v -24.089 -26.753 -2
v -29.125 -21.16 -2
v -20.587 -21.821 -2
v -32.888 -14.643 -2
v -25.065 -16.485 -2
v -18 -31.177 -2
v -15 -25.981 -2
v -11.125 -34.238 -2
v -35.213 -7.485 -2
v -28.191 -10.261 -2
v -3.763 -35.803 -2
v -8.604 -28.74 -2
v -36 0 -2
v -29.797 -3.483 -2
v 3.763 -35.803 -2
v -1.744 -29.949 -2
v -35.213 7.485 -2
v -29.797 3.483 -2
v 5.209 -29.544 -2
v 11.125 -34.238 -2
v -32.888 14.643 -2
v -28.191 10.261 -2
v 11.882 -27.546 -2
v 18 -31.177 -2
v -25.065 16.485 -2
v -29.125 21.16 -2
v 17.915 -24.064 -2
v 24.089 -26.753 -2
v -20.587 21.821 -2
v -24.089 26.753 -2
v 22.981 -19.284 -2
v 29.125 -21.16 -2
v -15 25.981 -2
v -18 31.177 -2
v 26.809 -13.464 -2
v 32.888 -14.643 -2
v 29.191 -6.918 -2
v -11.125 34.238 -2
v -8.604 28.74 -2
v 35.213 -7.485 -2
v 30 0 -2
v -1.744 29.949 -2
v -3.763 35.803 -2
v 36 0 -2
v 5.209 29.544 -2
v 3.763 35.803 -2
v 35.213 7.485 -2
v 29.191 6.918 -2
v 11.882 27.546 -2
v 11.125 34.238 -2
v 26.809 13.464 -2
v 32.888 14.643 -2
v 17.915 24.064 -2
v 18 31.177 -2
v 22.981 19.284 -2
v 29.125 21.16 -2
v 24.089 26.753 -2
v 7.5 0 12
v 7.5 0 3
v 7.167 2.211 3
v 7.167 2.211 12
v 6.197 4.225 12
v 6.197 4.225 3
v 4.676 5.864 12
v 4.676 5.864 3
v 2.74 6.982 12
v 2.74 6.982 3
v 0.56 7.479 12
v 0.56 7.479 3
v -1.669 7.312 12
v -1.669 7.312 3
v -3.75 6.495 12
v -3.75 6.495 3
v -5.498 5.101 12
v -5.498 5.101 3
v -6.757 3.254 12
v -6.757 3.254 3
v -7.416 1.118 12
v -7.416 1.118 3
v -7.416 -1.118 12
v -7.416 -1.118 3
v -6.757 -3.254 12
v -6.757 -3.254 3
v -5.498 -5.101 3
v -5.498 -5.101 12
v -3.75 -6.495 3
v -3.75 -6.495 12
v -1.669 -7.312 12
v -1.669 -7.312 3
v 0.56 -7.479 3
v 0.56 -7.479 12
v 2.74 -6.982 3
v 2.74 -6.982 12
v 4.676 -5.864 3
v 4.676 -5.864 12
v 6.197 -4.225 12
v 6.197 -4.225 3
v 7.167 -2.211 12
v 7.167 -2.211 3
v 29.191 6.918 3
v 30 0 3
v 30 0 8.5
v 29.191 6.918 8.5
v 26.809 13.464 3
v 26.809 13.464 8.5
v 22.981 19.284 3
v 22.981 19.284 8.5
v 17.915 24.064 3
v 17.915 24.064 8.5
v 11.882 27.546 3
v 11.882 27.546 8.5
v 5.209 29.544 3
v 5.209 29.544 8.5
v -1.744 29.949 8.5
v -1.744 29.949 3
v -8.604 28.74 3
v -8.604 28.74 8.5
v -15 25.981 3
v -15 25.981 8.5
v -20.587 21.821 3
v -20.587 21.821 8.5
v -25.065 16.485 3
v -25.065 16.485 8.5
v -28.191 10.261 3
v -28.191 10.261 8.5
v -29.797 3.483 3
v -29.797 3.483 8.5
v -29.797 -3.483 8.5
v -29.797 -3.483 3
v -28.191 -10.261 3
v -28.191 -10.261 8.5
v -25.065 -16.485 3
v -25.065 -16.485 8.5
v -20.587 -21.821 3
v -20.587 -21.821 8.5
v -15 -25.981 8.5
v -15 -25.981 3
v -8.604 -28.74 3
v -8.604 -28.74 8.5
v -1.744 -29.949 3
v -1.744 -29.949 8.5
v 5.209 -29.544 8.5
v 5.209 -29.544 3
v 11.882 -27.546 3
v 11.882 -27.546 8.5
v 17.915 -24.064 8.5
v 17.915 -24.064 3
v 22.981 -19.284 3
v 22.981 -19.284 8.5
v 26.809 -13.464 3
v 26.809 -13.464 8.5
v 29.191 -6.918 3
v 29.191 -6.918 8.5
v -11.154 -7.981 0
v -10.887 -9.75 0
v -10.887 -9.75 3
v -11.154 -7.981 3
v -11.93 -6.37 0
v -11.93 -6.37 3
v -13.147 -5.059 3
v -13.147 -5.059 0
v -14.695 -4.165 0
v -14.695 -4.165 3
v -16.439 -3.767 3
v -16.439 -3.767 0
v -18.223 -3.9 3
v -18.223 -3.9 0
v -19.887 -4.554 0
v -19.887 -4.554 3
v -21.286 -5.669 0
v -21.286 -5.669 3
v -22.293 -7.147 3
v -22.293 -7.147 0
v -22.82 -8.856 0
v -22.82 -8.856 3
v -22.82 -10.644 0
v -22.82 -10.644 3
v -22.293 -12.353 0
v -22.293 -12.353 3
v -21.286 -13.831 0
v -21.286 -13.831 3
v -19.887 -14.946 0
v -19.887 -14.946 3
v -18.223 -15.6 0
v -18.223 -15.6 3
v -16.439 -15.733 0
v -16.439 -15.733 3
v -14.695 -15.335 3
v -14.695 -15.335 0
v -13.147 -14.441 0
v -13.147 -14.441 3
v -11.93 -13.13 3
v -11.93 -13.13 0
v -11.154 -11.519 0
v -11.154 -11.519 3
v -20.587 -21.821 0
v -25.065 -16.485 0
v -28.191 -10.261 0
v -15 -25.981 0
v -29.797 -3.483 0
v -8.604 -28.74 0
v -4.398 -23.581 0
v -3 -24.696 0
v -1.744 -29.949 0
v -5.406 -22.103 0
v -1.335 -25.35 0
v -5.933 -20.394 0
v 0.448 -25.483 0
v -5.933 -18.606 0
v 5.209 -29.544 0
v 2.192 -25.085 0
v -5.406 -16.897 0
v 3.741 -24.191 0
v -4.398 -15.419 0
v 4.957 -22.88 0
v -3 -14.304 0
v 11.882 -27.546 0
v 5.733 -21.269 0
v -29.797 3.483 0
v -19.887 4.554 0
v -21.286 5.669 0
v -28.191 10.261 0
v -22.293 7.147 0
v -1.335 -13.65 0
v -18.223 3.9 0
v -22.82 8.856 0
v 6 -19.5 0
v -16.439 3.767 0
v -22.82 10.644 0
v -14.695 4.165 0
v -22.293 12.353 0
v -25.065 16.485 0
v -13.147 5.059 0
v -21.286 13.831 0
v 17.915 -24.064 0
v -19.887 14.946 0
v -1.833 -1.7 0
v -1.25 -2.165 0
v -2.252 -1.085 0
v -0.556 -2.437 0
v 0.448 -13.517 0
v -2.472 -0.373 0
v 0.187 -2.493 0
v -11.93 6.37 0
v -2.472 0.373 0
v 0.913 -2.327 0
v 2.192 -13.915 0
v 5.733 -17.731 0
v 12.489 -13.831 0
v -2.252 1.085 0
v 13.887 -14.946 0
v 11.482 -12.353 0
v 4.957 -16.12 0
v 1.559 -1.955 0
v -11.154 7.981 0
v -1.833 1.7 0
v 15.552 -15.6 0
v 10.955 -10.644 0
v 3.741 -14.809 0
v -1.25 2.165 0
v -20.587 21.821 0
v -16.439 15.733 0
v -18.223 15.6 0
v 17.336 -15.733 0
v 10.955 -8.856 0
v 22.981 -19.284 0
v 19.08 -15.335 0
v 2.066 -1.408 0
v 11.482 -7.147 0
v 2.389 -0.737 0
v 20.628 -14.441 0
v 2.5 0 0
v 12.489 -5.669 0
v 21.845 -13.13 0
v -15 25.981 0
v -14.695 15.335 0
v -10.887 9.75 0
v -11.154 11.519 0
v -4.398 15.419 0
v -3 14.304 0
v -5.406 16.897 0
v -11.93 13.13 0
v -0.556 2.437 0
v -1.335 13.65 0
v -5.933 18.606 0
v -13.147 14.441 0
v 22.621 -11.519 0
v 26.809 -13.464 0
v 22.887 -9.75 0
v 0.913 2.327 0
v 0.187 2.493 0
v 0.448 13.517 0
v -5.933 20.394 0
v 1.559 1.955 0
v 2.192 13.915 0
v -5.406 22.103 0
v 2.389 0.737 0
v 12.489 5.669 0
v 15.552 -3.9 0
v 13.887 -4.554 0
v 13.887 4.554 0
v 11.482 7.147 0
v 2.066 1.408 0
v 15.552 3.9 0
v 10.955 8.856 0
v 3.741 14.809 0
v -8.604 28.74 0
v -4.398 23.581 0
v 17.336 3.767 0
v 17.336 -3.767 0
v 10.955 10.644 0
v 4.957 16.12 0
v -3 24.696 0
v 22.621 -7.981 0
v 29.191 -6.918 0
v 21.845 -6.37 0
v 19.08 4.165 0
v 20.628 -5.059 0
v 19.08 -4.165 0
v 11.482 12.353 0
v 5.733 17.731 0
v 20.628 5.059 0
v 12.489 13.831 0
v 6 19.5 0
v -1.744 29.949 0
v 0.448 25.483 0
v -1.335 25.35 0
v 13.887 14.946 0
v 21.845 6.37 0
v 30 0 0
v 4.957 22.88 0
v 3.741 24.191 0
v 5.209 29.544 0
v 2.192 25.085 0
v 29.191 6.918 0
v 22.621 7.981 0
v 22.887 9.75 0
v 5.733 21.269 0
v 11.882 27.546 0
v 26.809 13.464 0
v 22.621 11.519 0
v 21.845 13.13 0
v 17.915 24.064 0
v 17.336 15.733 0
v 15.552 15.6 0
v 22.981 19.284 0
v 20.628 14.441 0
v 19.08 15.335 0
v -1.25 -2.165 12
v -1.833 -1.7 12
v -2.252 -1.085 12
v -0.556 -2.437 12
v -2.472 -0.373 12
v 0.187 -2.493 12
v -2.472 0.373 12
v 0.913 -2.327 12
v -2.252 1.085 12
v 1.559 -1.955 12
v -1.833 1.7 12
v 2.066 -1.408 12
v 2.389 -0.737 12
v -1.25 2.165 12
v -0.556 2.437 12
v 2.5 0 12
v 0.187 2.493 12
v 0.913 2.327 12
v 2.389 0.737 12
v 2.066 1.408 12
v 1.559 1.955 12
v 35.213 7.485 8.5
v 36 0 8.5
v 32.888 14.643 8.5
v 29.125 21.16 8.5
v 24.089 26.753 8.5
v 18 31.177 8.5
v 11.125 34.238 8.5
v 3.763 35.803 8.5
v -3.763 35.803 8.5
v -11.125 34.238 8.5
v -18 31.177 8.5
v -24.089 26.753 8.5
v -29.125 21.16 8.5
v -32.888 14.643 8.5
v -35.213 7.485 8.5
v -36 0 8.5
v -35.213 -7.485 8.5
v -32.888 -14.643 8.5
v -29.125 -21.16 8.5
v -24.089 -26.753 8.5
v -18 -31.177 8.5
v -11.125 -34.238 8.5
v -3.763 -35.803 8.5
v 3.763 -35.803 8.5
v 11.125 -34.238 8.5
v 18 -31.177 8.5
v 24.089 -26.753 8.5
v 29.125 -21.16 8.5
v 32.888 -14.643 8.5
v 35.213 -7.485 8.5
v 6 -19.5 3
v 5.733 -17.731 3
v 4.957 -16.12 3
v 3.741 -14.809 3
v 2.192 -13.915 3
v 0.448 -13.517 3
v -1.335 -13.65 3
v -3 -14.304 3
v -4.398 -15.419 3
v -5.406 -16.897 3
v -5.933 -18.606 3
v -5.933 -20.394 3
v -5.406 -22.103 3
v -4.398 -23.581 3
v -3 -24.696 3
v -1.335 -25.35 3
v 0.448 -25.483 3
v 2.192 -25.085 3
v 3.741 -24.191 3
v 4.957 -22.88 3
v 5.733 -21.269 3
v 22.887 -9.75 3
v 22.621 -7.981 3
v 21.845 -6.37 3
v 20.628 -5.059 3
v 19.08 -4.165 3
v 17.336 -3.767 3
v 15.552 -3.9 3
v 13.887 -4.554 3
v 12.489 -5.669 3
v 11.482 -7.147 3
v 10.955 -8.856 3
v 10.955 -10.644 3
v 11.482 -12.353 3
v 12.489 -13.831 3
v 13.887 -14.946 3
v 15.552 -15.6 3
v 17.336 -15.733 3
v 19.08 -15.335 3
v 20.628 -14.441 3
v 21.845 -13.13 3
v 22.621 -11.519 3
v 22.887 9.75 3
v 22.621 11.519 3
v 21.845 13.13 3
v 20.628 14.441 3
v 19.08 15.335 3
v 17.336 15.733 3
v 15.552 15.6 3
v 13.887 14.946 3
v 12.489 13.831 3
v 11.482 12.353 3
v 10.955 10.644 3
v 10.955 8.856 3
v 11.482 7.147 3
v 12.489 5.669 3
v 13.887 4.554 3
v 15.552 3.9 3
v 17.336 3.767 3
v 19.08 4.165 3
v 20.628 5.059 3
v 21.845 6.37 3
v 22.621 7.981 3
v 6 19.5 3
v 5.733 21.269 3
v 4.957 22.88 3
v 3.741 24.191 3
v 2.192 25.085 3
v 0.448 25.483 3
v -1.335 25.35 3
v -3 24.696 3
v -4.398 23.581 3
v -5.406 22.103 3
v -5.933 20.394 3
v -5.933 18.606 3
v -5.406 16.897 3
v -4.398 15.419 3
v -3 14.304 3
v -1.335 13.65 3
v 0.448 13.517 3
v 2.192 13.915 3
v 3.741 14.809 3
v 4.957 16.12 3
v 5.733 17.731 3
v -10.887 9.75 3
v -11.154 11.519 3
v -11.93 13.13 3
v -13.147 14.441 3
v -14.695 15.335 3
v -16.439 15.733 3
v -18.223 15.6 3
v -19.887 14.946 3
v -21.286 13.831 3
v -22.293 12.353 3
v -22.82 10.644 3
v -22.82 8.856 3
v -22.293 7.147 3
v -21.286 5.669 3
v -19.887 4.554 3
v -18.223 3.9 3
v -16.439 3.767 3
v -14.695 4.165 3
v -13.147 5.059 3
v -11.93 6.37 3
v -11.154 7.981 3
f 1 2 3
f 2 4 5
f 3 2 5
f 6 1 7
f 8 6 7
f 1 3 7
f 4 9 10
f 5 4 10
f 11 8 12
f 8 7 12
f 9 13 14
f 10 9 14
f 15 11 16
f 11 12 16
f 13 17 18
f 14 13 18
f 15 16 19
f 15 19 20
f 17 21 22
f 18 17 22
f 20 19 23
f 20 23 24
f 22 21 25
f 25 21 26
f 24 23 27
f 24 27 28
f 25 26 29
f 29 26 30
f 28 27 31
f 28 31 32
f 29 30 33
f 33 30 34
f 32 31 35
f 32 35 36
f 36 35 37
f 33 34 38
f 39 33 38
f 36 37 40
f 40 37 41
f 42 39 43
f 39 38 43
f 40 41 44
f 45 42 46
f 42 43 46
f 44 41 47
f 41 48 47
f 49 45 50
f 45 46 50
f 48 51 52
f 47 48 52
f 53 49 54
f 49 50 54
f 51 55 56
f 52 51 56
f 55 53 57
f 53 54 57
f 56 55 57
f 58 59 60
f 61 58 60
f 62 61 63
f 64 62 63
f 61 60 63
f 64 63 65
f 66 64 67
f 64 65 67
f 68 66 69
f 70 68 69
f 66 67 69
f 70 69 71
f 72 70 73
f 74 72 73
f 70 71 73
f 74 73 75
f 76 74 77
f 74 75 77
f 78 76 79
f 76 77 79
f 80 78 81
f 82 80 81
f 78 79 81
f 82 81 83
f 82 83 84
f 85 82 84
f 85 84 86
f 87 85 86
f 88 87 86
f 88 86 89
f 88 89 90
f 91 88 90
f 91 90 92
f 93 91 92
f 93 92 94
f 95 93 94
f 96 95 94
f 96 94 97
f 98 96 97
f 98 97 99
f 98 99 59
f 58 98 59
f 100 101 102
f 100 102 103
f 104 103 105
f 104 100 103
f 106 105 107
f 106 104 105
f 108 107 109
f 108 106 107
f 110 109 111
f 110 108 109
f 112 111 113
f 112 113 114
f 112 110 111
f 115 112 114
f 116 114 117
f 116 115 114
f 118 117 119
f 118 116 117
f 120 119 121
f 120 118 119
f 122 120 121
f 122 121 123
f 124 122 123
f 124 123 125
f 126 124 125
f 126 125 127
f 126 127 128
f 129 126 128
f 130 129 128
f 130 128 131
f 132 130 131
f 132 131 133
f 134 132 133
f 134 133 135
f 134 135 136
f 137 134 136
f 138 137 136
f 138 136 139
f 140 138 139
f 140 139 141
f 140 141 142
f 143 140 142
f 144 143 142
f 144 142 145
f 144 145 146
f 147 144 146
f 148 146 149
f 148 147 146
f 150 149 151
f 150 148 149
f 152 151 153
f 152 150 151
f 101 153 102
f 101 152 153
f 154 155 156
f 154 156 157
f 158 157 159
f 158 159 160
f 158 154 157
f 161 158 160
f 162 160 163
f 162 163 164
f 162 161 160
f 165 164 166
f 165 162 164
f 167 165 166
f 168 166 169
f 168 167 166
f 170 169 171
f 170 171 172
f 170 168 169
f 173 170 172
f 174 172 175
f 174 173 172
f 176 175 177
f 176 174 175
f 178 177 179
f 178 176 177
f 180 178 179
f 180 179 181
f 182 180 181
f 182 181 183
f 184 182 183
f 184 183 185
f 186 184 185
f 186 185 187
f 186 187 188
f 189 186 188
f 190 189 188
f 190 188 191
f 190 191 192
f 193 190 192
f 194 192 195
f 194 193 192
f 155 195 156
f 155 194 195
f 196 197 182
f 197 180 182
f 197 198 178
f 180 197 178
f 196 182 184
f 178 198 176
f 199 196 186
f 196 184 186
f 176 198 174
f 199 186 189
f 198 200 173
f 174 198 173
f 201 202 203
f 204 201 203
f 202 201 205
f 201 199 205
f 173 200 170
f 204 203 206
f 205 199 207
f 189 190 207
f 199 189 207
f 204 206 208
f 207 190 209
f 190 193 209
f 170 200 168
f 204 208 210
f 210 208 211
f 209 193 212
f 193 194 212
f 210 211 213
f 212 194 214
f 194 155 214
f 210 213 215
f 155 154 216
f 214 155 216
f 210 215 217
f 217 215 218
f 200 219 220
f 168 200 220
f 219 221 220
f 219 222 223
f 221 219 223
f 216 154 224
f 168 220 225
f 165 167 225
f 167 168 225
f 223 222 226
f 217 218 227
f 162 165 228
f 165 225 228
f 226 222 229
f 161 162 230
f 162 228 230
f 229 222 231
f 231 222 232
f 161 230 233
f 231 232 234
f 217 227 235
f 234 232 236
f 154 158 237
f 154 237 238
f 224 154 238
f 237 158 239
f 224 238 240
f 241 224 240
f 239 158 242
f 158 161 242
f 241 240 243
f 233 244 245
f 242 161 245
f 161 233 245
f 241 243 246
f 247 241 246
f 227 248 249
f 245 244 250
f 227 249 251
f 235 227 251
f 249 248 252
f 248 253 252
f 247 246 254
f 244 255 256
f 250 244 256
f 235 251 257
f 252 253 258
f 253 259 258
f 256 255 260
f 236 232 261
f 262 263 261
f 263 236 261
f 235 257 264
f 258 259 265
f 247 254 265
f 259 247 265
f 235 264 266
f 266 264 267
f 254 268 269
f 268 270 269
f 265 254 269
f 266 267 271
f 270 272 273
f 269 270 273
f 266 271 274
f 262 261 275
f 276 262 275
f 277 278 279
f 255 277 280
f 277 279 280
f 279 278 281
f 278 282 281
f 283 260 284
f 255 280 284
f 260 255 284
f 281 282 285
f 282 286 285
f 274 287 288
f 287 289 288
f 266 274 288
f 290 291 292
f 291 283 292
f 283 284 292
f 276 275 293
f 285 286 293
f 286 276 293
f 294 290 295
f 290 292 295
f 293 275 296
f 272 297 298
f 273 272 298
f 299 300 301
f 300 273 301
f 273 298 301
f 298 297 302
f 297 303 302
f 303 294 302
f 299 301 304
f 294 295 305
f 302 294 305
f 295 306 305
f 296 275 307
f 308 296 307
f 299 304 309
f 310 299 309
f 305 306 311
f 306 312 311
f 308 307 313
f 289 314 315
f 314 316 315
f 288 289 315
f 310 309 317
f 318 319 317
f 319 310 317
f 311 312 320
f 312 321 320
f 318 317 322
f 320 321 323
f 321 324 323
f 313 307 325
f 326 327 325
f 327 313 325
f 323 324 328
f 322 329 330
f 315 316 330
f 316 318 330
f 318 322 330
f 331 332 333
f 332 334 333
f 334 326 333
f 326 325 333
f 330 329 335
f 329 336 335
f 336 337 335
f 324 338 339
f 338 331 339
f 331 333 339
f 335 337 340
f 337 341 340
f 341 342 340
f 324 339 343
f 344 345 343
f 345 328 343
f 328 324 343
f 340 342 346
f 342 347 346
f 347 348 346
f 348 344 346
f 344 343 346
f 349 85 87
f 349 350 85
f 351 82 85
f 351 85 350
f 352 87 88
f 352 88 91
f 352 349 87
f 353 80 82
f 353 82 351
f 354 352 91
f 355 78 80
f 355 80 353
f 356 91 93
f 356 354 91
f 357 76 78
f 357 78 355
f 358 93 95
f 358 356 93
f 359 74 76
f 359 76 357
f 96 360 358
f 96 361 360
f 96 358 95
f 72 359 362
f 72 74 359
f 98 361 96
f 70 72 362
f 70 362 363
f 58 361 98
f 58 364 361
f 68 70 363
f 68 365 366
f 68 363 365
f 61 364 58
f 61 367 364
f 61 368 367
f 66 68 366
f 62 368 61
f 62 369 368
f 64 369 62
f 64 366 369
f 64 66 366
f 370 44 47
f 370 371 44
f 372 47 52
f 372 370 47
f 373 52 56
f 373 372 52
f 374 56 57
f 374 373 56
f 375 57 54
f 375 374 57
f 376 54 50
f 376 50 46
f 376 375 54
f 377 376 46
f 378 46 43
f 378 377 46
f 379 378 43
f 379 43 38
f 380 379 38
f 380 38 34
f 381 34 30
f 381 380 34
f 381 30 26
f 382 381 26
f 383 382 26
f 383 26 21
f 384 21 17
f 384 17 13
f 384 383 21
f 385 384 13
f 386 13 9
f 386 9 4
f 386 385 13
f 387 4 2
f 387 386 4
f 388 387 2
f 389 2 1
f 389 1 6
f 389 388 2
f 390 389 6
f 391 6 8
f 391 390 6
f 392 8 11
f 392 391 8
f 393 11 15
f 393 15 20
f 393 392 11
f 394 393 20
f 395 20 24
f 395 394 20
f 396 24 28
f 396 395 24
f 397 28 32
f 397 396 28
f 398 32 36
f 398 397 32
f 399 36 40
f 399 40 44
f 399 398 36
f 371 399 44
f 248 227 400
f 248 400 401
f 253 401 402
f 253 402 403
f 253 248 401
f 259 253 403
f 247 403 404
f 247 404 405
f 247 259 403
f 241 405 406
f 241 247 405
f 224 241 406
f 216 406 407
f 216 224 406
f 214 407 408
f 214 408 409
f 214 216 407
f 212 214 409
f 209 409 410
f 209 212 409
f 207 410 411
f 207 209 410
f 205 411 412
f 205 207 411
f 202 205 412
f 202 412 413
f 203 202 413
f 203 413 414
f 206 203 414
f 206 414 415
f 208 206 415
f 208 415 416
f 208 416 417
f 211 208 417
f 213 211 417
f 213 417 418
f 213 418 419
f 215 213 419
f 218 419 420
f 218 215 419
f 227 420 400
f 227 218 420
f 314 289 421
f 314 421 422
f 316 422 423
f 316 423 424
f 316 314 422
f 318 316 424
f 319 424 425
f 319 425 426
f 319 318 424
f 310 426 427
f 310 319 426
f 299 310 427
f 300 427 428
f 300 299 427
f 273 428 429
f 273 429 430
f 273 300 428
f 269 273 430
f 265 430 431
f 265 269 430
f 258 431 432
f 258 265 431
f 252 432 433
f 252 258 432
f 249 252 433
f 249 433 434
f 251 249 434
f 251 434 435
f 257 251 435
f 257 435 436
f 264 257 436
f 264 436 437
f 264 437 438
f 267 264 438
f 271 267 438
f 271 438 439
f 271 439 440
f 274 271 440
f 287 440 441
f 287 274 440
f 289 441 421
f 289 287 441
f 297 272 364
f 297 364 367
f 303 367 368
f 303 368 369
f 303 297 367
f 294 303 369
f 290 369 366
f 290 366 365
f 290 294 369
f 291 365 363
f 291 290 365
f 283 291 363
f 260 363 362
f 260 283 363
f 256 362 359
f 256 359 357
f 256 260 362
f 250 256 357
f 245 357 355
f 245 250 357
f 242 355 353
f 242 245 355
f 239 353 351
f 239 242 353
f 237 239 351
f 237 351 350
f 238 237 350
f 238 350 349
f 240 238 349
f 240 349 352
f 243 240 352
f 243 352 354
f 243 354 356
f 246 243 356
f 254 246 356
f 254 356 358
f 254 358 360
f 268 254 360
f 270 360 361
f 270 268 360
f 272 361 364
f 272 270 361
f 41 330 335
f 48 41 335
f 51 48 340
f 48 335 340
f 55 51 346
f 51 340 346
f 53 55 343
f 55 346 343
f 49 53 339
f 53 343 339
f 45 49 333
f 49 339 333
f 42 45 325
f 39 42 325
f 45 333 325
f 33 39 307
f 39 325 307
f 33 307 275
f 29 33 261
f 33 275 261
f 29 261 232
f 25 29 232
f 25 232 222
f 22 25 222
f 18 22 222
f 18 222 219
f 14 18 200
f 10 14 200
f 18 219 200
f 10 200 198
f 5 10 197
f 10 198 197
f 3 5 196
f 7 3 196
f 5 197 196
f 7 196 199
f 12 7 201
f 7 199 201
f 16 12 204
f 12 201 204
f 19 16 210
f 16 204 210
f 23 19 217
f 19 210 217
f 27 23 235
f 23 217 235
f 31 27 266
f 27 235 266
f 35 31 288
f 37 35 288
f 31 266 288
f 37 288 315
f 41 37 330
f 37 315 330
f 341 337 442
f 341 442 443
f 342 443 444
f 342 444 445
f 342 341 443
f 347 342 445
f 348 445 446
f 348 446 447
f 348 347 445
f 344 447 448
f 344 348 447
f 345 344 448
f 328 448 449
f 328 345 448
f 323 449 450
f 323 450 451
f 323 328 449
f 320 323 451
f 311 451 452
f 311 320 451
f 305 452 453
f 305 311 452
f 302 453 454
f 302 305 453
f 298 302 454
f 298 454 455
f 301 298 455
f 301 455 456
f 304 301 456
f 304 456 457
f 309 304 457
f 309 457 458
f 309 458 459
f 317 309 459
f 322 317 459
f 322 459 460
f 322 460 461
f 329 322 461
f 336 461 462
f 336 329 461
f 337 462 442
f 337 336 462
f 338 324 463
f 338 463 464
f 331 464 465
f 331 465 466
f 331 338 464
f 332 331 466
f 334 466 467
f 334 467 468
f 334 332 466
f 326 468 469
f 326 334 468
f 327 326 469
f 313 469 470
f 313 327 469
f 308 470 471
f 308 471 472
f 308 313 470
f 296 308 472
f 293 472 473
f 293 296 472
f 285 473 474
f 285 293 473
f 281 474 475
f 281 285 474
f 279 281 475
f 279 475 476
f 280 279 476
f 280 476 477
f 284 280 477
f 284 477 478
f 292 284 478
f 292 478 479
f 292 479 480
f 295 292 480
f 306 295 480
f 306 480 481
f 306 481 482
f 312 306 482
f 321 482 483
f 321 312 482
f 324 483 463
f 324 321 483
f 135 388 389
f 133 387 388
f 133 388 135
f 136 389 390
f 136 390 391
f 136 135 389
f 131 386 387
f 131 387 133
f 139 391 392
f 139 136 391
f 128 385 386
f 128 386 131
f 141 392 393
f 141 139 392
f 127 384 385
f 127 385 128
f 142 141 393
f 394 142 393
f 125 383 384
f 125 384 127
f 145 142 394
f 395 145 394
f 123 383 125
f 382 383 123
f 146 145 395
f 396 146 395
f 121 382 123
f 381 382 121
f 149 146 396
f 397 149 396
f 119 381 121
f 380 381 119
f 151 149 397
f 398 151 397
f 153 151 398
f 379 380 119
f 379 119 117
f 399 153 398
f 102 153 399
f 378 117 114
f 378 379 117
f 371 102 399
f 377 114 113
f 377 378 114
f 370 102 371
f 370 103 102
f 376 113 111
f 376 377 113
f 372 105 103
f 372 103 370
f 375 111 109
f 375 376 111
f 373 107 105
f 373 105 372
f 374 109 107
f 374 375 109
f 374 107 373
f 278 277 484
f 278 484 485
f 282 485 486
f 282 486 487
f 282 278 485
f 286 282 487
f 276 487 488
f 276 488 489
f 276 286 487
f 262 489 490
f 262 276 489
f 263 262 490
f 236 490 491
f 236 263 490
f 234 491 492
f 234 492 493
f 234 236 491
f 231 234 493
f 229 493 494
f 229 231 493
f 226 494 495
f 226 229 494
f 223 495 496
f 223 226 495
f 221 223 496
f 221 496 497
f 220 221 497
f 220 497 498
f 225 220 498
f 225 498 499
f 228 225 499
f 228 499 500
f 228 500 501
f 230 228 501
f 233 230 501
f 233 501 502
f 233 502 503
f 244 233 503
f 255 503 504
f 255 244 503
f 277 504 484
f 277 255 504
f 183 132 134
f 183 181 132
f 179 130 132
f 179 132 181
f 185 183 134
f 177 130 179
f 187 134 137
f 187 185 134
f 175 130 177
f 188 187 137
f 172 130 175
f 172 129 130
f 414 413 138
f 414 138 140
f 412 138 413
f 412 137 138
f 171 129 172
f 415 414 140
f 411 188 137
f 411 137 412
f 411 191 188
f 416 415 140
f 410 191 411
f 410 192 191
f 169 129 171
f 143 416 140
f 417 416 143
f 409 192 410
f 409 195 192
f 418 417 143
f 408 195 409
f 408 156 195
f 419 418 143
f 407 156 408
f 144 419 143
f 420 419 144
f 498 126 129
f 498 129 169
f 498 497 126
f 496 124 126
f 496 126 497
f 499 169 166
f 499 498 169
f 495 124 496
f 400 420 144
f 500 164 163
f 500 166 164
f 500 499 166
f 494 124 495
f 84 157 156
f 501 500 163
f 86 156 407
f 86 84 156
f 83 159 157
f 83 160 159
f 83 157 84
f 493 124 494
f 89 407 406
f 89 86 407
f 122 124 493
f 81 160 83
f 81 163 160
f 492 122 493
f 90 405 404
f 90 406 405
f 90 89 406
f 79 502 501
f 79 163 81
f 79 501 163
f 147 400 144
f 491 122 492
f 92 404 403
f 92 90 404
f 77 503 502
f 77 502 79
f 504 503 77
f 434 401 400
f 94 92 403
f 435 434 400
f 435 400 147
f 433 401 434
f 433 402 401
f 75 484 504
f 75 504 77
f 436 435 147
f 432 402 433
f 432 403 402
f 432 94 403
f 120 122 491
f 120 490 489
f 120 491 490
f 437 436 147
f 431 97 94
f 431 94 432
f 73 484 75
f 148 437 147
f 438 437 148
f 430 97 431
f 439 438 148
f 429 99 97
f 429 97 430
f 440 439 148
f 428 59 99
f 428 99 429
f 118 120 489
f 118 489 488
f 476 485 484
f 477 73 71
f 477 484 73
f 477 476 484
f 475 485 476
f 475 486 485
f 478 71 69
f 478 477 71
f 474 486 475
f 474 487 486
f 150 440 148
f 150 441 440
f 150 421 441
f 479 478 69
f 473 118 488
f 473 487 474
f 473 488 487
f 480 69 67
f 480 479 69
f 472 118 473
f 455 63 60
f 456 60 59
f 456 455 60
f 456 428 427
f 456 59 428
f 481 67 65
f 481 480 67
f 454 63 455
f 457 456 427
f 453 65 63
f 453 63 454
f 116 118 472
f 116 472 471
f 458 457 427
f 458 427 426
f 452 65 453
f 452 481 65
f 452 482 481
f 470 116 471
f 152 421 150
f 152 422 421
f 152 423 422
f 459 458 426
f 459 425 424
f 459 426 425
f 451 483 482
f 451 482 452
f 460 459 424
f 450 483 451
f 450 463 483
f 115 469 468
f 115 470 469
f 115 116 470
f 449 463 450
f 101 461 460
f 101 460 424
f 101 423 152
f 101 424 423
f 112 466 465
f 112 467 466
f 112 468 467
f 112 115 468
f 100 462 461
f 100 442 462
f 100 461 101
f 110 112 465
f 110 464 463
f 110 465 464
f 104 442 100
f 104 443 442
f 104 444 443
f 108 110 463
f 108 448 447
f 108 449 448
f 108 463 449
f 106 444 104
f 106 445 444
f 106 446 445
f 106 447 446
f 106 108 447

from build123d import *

# Parameters (mm, degrees)
ESQUISSE1_R             = 7.5
ESQUISSE1_R_2           = 2.5
BOSS_EXTRU_1_DEPTH      = 12
ESQUISSE1_3_R           = 30
ESQUISSE1_3_R_2         = 6
ESQUISSE1_3_R_3         = 7.5
BOSS_EXTRU_2_DEPTH      = 3
BOSS_EXTRU_3_DEPTH      = 8.5
BOSS_EXTRU_3_DEPTH_BACK = 2
ESQUISSE1_4_R           = 36
ESQUISSE1_4_R_2         = 30


with BuildPart() as part:
    # Esquisse1 → Boss.-Extru.1 (new body)
    with BuildSketch(Plane.XY):
        Circle(ESQUISSE1_R)
        Circle(ESQUISSE1_R_2, mode=Mode.SUBTRACT)
    extrude(amount=BOSS_EXTRU_1_DEPTH)

    # Esquisse1<3> → Boss.-Extru.2 (add)
    with BuildSketch(Plane.XY):
        Circle(ESQUISSE1_3_R)
        with Locations((-16.887495374, -9.75)):
            Circle(ESQUISSE1_3_R_2, mode=Mode.SUBTRACT)
        with Locations((0, -19.5)):
            Circle(ESQUISSE1_3_R_2, mode=Mode.SUBTRACT)
        with Locations((16.887495374, -9.75)):
            Circle(ESQUISSE1_3_R_2, mode=Mode.SUBTRACT)
        with Locations((-16.887495374, 9.75)):
            Circle(ESQUISSE1_3_R_2, mode=Mode.SUBTRACT)
        Circle(ESQUISSE1_3_R_3, mode=Mode.SUBTRACT)
        with Locations((16.887495374, 9.75)):
            Circle(ESQUISSE1_3_R_2, mode=Mode.SUBTRACT)
        with Locations((0, 19.5)):
            Circle(ESQUISSE1_3_R_2, mode=Mode.SUBTRACT)
    extrude(amount=BOSS_EXTRU_2_DEPTH)

    # Esquisse1<4> → Boss.-Extru.3 (add, two sides: drawn at the far end of the back side and taken through both)
    with BuildSketch(Plane.XY.offset(-BOSS_EXTRU_3_DEPTH_BACK)):
        Circle(ESQUISSE1_4_R)
        Circle(ESQUISSE1_4_R_2, mode=Mode.SUBTRACT)
    extrude(amount=BOSS_EXTRU_3_DEPTH + BOSS_EXTRU_3_DEPTH_BACK)


solid = part.part
